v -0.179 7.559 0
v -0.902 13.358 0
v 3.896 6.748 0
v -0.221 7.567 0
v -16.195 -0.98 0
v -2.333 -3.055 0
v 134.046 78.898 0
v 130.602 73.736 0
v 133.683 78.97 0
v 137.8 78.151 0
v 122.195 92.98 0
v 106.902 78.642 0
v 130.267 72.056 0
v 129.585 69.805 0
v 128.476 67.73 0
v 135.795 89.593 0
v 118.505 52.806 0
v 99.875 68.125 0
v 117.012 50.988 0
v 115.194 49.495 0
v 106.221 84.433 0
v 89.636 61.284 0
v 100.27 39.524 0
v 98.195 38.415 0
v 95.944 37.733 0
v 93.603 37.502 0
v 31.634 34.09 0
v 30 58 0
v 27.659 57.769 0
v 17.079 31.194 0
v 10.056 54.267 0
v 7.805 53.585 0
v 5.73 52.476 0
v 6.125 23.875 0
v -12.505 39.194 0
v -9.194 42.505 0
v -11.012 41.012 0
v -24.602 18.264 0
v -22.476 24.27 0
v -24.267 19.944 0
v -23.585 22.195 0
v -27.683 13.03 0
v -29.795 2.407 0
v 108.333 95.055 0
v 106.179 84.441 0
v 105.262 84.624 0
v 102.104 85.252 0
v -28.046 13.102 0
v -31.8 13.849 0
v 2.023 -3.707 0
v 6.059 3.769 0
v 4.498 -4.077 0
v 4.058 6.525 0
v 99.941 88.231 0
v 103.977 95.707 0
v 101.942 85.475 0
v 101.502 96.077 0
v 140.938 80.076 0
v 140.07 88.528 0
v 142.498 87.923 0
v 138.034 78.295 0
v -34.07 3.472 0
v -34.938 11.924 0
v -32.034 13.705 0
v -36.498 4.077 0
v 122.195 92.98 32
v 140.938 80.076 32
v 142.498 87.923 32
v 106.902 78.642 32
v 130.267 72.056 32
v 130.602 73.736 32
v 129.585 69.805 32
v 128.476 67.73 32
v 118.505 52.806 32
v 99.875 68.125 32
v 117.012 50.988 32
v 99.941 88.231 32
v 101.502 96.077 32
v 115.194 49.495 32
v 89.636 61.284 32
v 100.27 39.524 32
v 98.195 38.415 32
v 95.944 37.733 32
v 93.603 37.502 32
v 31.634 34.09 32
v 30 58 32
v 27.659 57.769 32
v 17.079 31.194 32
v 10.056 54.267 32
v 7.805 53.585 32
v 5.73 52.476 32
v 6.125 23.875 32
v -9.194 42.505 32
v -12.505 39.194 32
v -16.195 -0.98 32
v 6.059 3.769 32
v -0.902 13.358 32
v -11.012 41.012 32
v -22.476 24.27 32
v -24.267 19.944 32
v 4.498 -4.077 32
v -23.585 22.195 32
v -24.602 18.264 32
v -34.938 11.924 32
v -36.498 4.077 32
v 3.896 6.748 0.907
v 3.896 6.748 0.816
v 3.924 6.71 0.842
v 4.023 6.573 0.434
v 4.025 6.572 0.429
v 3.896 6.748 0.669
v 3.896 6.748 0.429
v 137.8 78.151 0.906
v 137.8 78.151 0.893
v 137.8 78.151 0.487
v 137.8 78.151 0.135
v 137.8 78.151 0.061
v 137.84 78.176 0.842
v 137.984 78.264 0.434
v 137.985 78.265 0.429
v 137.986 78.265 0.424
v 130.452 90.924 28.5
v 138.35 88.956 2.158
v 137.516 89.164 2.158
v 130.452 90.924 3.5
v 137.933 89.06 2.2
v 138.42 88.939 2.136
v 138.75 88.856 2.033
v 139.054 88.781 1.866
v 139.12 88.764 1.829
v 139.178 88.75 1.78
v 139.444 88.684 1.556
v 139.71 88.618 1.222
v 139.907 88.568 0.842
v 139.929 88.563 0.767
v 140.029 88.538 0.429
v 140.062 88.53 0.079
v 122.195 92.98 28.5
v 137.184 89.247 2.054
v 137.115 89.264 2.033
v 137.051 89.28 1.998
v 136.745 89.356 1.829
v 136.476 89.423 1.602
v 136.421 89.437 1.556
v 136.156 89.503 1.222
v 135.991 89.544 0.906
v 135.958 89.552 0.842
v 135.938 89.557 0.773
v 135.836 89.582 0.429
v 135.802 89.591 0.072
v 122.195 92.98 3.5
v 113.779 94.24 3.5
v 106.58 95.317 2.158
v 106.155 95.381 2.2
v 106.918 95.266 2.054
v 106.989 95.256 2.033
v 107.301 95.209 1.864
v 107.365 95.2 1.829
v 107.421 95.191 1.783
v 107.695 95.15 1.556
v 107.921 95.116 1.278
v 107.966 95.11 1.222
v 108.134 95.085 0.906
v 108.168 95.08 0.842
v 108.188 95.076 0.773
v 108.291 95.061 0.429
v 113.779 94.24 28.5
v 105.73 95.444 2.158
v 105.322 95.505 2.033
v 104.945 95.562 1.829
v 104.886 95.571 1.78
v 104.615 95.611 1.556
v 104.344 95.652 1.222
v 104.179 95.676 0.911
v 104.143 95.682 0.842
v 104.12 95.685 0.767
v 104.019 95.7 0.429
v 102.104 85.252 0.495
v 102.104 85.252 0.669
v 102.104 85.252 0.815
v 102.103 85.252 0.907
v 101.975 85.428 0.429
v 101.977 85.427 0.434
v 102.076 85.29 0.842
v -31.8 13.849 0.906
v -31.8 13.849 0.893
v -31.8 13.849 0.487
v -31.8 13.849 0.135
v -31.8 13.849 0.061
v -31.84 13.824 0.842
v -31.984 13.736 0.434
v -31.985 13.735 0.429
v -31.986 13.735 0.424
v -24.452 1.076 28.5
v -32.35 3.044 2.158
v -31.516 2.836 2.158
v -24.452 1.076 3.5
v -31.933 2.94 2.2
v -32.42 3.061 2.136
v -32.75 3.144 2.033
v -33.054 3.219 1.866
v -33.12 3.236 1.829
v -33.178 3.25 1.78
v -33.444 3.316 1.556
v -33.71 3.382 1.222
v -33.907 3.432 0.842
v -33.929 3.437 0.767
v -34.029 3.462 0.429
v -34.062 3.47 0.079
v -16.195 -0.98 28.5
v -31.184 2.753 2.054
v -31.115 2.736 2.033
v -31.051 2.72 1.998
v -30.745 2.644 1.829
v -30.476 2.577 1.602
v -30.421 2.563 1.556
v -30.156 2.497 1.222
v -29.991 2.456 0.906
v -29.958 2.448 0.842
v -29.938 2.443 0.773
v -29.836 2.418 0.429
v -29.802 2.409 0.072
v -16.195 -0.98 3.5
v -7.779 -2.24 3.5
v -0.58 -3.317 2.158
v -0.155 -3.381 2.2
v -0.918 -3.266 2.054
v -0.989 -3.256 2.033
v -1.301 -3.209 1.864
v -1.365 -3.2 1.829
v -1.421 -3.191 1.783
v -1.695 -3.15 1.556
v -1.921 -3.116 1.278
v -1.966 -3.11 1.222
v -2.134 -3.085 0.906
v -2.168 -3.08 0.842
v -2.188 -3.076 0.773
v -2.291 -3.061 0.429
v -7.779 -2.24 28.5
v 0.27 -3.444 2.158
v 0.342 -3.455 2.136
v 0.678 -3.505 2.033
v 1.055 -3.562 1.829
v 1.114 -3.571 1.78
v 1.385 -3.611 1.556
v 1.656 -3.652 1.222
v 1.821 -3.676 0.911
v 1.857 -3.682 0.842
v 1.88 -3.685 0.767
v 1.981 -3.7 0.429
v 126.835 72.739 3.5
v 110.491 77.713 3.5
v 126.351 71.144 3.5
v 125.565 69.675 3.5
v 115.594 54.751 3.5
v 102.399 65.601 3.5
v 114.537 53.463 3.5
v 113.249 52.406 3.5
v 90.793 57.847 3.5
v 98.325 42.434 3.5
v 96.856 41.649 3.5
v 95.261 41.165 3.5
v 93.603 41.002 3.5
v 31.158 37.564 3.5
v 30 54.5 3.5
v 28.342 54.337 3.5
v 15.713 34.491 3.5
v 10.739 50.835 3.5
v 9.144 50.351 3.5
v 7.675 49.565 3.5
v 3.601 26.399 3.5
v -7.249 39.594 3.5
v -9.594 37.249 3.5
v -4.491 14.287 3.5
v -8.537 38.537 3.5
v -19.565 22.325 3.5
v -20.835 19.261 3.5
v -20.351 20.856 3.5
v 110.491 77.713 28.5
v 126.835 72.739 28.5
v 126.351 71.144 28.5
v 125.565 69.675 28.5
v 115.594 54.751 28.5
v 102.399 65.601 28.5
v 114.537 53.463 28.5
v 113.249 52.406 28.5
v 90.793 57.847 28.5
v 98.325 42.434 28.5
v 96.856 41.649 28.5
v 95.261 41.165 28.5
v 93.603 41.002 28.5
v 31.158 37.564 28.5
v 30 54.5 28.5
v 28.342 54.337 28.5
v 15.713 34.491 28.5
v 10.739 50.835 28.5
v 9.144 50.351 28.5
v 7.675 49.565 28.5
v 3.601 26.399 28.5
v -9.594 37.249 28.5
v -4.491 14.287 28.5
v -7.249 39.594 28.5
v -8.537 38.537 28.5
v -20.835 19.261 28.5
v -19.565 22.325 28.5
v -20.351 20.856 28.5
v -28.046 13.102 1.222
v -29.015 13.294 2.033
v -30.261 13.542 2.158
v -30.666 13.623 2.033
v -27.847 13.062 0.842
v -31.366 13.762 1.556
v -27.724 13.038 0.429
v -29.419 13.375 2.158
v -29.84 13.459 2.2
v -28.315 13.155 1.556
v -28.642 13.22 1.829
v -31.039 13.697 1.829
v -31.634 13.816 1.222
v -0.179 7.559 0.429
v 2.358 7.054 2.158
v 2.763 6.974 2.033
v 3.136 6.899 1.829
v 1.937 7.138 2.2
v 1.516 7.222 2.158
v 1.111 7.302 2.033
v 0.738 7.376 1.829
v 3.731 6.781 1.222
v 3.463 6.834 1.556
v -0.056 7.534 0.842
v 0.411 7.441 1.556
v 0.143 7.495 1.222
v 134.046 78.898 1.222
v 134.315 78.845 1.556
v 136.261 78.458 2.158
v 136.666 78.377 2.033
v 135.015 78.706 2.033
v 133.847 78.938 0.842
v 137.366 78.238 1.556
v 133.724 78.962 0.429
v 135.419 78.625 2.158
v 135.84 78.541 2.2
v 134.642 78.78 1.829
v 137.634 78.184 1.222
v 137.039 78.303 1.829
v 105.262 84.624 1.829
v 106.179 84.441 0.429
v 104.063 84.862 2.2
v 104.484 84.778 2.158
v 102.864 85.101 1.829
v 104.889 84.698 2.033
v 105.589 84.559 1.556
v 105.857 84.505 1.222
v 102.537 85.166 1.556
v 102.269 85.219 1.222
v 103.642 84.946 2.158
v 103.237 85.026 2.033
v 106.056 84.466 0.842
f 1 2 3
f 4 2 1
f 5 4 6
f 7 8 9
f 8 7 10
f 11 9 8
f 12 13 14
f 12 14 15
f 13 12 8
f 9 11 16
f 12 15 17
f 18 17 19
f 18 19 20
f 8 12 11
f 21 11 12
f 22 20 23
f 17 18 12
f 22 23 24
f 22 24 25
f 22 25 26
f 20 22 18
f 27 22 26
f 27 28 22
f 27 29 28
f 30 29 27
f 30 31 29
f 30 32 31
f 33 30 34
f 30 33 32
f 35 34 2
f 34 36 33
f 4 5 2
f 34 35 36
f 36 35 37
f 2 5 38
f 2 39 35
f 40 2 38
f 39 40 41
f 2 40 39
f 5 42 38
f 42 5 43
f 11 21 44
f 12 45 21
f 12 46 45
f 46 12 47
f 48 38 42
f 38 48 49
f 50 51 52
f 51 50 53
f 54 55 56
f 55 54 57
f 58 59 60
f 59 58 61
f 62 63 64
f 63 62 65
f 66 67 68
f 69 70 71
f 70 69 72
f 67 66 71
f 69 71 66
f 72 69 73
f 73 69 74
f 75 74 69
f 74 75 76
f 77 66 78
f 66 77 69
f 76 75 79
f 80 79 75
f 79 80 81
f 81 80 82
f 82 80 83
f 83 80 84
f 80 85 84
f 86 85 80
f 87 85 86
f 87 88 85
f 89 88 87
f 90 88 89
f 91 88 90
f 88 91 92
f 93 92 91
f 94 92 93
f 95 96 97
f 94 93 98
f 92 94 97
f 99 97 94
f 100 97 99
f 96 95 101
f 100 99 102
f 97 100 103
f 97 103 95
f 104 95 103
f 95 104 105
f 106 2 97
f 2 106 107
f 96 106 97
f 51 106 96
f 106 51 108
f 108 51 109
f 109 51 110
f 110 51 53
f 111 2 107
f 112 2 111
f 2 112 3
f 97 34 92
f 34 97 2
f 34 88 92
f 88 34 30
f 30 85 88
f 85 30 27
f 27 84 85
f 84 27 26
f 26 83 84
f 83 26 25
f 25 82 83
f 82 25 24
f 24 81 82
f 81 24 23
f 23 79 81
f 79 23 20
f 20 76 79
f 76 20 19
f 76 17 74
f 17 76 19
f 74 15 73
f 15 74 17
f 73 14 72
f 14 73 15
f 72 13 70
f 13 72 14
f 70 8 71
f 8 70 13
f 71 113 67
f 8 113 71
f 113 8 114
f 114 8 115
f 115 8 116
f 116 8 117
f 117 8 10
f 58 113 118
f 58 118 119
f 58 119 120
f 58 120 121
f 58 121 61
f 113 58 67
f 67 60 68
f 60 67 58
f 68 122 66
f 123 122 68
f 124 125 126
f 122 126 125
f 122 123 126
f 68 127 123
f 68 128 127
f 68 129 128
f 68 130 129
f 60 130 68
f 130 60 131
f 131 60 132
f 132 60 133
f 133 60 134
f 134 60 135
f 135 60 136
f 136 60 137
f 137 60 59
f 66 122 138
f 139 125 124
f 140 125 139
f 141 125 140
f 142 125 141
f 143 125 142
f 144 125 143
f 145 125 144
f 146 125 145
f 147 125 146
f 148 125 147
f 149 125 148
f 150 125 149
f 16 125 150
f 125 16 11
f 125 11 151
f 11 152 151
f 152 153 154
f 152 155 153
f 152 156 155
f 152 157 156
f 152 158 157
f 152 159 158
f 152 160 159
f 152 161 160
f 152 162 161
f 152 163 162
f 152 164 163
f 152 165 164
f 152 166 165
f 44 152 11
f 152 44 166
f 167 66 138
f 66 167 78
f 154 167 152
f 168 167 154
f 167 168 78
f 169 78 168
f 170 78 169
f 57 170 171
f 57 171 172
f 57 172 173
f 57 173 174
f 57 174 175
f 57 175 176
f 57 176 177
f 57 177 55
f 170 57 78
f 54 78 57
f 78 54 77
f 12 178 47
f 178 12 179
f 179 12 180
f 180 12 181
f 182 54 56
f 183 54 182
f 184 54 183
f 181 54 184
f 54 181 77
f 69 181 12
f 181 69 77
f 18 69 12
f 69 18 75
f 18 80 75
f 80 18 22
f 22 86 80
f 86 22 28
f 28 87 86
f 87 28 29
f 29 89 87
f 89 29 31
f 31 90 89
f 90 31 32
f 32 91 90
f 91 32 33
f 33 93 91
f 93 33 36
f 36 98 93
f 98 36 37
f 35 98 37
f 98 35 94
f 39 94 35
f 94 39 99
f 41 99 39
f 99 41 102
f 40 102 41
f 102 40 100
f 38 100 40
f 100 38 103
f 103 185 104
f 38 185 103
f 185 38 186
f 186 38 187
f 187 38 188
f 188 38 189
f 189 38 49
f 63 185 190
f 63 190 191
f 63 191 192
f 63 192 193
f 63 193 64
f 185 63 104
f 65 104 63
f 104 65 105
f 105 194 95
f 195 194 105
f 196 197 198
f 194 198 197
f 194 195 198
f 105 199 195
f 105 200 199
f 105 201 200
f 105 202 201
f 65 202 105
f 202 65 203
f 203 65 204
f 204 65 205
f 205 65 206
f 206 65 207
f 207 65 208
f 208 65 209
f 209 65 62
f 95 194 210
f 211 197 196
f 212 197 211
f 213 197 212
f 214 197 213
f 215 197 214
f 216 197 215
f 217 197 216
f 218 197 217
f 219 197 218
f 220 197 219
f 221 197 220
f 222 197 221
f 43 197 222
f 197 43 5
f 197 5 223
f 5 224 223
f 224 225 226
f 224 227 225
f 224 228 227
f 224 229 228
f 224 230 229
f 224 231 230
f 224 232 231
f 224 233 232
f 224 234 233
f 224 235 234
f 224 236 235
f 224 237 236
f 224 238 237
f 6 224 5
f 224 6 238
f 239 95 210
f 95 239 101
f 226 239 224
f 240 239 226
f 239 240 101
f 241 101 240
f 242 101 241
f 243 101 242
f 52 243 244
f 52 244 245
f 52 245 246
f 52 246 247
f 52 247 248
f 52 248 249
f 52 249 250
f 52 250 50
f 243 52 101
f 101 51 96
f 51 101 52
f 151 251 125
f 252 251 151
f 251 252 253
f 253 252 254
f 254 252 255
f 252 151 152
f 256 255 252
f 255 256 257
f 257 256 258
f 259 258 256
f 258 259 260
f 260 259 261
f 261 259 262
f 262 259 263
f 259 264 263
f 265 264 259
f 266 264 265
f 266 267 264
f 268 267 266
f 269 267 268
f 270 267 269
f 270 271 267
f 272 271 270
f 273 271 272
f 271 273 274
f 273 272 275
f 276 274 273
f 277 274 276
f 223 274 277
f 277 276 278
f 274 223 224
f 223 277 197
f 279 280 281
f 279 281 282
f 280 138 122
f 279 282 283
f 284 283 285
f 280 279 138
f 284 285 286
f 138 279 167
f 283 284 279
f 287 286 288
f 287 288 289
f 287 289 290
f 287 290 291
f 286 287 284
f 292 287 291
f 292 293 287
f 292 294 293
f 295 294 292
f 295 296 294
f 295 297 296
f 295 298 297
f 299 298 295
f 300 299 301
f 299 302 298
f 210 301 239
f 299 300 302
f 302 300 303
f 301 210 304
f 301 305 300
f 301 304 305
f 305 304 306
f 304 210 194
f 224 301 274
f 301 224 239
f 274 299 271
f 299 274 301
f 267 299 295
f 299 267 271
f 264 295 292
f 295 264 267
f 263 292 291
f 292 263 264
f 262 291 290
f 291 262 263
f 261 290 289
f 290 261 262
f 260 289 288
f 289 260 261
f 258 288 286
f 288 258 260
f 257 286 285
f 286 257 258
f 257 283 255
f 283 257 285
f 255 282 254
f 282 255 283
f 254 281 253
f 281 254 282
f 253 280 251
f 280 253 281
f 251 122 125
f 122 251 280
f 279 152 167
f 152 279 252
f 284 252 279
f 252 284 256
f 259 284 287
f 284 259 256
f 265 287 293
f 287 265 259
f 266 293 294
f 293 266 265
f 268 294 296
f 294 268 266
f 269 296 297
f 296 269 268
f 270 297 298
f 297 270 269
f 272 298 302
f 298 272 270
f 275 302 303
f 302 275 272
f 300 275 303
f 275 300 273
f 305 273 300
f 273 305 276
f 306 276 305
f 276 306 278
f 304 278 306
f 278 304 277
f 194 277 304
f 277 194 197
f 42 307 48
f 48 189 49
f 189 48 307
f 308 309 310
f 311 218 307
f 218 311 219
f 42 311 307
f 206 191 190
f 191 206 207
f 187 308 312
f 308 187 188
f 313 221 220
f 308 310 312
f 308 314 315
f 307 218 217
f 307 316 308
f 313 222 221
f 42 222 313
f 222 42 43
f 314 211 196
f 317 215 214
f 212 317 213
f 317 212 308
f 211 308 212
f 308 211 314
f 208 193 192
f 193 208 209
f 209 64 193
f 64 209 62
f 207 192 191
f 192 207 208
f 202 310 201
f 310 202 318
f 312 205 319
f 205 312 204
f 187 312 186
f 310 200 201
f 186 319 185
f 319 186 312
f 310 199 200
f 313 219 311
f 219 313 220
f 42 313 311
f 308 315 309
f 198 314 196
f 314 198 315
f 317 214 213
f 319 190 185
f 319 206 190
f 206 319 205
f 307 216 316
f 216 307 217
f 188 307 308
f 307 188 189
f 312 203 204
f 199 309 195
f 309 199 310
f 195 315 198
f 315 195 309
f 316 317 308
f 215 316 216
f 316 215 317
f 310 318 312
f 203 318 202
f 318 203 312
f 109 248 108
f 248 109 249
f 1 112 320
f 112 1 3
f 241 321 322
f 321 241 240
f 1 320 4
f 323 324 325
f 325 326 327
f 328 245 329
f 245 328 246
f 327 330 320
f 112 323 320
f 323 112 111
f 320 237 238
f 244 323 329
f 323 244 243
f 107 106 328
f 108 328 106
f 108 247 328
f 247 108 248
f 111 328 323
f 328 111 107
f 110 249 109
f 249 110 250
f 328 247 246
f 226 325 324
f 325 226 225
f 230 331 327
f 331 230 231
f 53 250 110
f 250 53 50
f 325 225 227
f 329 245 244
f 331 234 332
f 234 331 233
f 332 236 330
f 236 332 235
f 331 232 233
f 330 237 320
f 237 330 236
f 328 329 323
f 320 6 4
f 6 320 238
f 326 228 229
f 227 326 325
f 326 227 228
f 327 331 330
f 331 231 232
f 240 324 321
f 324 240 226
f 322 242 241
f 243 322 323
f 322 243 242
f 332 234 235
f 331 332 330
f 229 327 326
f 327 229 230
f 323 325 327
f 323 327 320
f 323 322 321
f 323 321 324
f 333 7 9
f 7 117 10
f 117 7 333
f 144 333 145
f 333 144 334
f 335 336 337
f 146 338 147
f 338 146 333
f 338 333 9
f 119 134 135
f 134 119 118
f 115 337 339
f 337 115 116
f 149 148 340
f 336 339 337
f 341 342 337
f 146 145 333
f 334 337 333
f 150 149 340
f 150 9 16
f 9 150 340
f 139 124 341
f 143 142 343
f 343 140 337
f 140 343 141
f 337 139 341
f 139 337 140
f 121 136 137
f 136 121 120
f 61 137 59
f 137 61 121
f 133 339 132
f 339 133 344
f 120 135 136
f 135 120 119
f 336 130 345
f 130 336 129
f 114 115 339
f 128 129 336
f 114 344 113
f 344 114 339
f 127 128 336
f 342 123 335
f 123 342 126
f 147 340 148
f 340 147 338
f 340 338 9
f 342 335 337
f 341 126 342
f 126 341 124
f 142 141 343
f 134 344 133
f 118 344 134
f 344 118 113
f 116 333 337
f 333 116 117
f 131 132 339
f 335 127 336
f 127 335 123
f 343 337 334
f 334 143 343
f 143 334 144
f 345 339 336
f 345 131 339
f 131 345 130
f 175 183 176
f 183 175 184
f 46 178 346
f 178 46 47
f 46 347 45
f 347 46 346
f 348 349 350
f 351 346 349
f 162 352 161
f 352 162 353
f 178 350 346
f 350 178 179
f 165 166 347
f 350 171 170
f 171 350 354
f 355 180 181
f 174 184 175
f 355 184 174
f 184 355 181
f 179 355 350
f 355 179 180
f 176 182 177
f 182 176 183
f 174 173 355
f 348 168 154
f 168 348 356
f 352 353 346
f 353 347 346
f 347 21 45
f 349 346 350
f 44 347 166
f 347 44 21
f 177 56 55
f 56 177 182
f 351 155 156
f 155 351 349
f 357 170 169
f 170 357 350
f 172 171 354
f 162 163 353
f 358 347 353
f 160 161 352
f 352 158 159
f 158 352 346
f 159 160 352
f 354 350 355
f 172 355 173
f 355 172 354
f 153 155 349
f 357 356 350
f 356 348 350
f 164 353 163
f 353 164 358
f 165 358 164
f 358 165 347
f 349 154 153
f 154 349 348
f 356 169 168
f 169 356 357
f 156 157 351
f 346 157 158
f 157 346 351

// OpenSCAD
$fn = 32;

// ----------------------------------------------------------------------
// Air duct: 24 mm duct, 3.5 mm wall, 32 mm across
// ----------------------------------------------------------------------

// --- parameters (mm) ---
duct_r = 12;              // duct core radius
duct_d = 24;              // duct core diameter
wall = 3.5;               // duct wall thickness
height = 32;              // duct width (extrusion height)
port_r = 20.9;            // port flange half width
port_d = 41.8;            // port flange width
port_t = 8;               // port flange thickness
bolt_d = 4.4;             // port bolt holes
bolt_offset = 16.2;       // bolt hole offset from the port axis

difference() {
  /* outer hull chain: tube with a flat flange plate at every port */
  linear_extrude(height = 32) {
    hull() {
      polygon([[4.498, -4.077], [-36.498, 4.077], [-34.938, 11.924], [6.059, 3.769]]);
      translate([-13.854, 10.789]) circle(r = 12);
    }
    hull() {
      translate([-13.854, 10.789]) circle(r = 12);
      translate([-12.498, 17.603]) circle(r = 12);
    }
    hull() {
      translate([-12.498, 17.603]) circle(r = 12);
      translate([-2.527, 32.527]) circle(r = 12);
    }
    hull() {
      translate([-2.527, 32.527]) circle(r = 12);
      translate([12.397, 42.498]) circle(r = 12);
    }
    hull() {
      translate([12.397, 42.498]) circle(r = 12);
      translate([30, 46]) circle(r = 12);
    }
    hull() {
      translate([30, 46]) circle(r = 12);
      translate([93.603, 49.502]) circle(r = 12);
    }
    hull() {
      translate([93.603, 49.502]) circle(r = 12);
      translate([108.527, 59.473]) circle(r = 12);
    }
    hull() {
      translate([108.527, 59.473]) circle(r = 12);
      translate([118.498, 74.397]) circle(r = 12);
    }
    hull() {
      translate([118.498, 74.397]) circle(r = 12);
      translate([119.854, 81.211]) circle(r = 12);
    }
    hull() {
      translate([119.854, 81.211]) circle(r = 12);
      polygon([[101.502, 96.077], [142.498, 87.923], [140.938, 80.076], [99.941, 88.231]]);
    }
  }
  /* air passage: the same chain inset by the wall, 5 mm proud of the ports */
  translate([0, 0, 3.5]) linear_extrude(height = 25) {
    hull() {
      translate([-16.975, -4.904]) circle(r = 8.5);
      translate([-12.498, 17.603]) circle(r = 8.5);
    }
    hull() {
      translate([-12.498, 17.603]) circle(r = 8.5);
      translate([-2.527, 32.527]) circle(r = 8.5);
    }
    hull() {
      translate([-2.527, 32.527]) circle(r = 8.5);
      translate([12.397, 42.498]) circle(r = 8.5);
    }
    hull() {
      translate([12.397, 42.498]) circle(r = 8.5);
      translate([30, 46]) circle(r = 8.5);
    }
    hull() {
      translate([30, 46]) circle(r = 8.5);
      translate([93.603, 49.502]) circle(r = 8.5);
    }
    hull() {
      translate([93.603, 49.502]) circle(r = 8.5);
      translate([108.527, 59.473]) circle(r = 8.5);
    }
    hull() {
      translate([108.527, 59.473]) circle(r = 8.5);
      translate([118.498, 74.397]) circle(r = 8.5);
    }
    hull() {
      translate([118.498, 74.397]) circle(r = 8.5);
      translate([122.975, 96.904]) circle(r = 8.5);
    }
  }
  translate([-16, 0]) rotate([0, 0, -11.25]) translate([-16.2, -2.5]) rotate([-90, 0, 0]) cylinder(h = 13, d = 4.4);
  translate([-16, 0]) rotate([0, 0, -11.25]) translate([16.2, -2.5]) rotate([-90, 0, 0]) cylinder(h = 13, d = 4.4);
  translate([122, 92]) rotate([0, 0, 168.75]) translate([-16.2, -2.5]) rotate([-90, 0, 0]) cylinder(h = 13, d = 4.4);
  translate([122, 92]) rotate([0, 0, 168.75]) translate([16.2, -2.5]) rotate([-90, 0, 0]) cylinder(h = 13, d = 4.4);
}
